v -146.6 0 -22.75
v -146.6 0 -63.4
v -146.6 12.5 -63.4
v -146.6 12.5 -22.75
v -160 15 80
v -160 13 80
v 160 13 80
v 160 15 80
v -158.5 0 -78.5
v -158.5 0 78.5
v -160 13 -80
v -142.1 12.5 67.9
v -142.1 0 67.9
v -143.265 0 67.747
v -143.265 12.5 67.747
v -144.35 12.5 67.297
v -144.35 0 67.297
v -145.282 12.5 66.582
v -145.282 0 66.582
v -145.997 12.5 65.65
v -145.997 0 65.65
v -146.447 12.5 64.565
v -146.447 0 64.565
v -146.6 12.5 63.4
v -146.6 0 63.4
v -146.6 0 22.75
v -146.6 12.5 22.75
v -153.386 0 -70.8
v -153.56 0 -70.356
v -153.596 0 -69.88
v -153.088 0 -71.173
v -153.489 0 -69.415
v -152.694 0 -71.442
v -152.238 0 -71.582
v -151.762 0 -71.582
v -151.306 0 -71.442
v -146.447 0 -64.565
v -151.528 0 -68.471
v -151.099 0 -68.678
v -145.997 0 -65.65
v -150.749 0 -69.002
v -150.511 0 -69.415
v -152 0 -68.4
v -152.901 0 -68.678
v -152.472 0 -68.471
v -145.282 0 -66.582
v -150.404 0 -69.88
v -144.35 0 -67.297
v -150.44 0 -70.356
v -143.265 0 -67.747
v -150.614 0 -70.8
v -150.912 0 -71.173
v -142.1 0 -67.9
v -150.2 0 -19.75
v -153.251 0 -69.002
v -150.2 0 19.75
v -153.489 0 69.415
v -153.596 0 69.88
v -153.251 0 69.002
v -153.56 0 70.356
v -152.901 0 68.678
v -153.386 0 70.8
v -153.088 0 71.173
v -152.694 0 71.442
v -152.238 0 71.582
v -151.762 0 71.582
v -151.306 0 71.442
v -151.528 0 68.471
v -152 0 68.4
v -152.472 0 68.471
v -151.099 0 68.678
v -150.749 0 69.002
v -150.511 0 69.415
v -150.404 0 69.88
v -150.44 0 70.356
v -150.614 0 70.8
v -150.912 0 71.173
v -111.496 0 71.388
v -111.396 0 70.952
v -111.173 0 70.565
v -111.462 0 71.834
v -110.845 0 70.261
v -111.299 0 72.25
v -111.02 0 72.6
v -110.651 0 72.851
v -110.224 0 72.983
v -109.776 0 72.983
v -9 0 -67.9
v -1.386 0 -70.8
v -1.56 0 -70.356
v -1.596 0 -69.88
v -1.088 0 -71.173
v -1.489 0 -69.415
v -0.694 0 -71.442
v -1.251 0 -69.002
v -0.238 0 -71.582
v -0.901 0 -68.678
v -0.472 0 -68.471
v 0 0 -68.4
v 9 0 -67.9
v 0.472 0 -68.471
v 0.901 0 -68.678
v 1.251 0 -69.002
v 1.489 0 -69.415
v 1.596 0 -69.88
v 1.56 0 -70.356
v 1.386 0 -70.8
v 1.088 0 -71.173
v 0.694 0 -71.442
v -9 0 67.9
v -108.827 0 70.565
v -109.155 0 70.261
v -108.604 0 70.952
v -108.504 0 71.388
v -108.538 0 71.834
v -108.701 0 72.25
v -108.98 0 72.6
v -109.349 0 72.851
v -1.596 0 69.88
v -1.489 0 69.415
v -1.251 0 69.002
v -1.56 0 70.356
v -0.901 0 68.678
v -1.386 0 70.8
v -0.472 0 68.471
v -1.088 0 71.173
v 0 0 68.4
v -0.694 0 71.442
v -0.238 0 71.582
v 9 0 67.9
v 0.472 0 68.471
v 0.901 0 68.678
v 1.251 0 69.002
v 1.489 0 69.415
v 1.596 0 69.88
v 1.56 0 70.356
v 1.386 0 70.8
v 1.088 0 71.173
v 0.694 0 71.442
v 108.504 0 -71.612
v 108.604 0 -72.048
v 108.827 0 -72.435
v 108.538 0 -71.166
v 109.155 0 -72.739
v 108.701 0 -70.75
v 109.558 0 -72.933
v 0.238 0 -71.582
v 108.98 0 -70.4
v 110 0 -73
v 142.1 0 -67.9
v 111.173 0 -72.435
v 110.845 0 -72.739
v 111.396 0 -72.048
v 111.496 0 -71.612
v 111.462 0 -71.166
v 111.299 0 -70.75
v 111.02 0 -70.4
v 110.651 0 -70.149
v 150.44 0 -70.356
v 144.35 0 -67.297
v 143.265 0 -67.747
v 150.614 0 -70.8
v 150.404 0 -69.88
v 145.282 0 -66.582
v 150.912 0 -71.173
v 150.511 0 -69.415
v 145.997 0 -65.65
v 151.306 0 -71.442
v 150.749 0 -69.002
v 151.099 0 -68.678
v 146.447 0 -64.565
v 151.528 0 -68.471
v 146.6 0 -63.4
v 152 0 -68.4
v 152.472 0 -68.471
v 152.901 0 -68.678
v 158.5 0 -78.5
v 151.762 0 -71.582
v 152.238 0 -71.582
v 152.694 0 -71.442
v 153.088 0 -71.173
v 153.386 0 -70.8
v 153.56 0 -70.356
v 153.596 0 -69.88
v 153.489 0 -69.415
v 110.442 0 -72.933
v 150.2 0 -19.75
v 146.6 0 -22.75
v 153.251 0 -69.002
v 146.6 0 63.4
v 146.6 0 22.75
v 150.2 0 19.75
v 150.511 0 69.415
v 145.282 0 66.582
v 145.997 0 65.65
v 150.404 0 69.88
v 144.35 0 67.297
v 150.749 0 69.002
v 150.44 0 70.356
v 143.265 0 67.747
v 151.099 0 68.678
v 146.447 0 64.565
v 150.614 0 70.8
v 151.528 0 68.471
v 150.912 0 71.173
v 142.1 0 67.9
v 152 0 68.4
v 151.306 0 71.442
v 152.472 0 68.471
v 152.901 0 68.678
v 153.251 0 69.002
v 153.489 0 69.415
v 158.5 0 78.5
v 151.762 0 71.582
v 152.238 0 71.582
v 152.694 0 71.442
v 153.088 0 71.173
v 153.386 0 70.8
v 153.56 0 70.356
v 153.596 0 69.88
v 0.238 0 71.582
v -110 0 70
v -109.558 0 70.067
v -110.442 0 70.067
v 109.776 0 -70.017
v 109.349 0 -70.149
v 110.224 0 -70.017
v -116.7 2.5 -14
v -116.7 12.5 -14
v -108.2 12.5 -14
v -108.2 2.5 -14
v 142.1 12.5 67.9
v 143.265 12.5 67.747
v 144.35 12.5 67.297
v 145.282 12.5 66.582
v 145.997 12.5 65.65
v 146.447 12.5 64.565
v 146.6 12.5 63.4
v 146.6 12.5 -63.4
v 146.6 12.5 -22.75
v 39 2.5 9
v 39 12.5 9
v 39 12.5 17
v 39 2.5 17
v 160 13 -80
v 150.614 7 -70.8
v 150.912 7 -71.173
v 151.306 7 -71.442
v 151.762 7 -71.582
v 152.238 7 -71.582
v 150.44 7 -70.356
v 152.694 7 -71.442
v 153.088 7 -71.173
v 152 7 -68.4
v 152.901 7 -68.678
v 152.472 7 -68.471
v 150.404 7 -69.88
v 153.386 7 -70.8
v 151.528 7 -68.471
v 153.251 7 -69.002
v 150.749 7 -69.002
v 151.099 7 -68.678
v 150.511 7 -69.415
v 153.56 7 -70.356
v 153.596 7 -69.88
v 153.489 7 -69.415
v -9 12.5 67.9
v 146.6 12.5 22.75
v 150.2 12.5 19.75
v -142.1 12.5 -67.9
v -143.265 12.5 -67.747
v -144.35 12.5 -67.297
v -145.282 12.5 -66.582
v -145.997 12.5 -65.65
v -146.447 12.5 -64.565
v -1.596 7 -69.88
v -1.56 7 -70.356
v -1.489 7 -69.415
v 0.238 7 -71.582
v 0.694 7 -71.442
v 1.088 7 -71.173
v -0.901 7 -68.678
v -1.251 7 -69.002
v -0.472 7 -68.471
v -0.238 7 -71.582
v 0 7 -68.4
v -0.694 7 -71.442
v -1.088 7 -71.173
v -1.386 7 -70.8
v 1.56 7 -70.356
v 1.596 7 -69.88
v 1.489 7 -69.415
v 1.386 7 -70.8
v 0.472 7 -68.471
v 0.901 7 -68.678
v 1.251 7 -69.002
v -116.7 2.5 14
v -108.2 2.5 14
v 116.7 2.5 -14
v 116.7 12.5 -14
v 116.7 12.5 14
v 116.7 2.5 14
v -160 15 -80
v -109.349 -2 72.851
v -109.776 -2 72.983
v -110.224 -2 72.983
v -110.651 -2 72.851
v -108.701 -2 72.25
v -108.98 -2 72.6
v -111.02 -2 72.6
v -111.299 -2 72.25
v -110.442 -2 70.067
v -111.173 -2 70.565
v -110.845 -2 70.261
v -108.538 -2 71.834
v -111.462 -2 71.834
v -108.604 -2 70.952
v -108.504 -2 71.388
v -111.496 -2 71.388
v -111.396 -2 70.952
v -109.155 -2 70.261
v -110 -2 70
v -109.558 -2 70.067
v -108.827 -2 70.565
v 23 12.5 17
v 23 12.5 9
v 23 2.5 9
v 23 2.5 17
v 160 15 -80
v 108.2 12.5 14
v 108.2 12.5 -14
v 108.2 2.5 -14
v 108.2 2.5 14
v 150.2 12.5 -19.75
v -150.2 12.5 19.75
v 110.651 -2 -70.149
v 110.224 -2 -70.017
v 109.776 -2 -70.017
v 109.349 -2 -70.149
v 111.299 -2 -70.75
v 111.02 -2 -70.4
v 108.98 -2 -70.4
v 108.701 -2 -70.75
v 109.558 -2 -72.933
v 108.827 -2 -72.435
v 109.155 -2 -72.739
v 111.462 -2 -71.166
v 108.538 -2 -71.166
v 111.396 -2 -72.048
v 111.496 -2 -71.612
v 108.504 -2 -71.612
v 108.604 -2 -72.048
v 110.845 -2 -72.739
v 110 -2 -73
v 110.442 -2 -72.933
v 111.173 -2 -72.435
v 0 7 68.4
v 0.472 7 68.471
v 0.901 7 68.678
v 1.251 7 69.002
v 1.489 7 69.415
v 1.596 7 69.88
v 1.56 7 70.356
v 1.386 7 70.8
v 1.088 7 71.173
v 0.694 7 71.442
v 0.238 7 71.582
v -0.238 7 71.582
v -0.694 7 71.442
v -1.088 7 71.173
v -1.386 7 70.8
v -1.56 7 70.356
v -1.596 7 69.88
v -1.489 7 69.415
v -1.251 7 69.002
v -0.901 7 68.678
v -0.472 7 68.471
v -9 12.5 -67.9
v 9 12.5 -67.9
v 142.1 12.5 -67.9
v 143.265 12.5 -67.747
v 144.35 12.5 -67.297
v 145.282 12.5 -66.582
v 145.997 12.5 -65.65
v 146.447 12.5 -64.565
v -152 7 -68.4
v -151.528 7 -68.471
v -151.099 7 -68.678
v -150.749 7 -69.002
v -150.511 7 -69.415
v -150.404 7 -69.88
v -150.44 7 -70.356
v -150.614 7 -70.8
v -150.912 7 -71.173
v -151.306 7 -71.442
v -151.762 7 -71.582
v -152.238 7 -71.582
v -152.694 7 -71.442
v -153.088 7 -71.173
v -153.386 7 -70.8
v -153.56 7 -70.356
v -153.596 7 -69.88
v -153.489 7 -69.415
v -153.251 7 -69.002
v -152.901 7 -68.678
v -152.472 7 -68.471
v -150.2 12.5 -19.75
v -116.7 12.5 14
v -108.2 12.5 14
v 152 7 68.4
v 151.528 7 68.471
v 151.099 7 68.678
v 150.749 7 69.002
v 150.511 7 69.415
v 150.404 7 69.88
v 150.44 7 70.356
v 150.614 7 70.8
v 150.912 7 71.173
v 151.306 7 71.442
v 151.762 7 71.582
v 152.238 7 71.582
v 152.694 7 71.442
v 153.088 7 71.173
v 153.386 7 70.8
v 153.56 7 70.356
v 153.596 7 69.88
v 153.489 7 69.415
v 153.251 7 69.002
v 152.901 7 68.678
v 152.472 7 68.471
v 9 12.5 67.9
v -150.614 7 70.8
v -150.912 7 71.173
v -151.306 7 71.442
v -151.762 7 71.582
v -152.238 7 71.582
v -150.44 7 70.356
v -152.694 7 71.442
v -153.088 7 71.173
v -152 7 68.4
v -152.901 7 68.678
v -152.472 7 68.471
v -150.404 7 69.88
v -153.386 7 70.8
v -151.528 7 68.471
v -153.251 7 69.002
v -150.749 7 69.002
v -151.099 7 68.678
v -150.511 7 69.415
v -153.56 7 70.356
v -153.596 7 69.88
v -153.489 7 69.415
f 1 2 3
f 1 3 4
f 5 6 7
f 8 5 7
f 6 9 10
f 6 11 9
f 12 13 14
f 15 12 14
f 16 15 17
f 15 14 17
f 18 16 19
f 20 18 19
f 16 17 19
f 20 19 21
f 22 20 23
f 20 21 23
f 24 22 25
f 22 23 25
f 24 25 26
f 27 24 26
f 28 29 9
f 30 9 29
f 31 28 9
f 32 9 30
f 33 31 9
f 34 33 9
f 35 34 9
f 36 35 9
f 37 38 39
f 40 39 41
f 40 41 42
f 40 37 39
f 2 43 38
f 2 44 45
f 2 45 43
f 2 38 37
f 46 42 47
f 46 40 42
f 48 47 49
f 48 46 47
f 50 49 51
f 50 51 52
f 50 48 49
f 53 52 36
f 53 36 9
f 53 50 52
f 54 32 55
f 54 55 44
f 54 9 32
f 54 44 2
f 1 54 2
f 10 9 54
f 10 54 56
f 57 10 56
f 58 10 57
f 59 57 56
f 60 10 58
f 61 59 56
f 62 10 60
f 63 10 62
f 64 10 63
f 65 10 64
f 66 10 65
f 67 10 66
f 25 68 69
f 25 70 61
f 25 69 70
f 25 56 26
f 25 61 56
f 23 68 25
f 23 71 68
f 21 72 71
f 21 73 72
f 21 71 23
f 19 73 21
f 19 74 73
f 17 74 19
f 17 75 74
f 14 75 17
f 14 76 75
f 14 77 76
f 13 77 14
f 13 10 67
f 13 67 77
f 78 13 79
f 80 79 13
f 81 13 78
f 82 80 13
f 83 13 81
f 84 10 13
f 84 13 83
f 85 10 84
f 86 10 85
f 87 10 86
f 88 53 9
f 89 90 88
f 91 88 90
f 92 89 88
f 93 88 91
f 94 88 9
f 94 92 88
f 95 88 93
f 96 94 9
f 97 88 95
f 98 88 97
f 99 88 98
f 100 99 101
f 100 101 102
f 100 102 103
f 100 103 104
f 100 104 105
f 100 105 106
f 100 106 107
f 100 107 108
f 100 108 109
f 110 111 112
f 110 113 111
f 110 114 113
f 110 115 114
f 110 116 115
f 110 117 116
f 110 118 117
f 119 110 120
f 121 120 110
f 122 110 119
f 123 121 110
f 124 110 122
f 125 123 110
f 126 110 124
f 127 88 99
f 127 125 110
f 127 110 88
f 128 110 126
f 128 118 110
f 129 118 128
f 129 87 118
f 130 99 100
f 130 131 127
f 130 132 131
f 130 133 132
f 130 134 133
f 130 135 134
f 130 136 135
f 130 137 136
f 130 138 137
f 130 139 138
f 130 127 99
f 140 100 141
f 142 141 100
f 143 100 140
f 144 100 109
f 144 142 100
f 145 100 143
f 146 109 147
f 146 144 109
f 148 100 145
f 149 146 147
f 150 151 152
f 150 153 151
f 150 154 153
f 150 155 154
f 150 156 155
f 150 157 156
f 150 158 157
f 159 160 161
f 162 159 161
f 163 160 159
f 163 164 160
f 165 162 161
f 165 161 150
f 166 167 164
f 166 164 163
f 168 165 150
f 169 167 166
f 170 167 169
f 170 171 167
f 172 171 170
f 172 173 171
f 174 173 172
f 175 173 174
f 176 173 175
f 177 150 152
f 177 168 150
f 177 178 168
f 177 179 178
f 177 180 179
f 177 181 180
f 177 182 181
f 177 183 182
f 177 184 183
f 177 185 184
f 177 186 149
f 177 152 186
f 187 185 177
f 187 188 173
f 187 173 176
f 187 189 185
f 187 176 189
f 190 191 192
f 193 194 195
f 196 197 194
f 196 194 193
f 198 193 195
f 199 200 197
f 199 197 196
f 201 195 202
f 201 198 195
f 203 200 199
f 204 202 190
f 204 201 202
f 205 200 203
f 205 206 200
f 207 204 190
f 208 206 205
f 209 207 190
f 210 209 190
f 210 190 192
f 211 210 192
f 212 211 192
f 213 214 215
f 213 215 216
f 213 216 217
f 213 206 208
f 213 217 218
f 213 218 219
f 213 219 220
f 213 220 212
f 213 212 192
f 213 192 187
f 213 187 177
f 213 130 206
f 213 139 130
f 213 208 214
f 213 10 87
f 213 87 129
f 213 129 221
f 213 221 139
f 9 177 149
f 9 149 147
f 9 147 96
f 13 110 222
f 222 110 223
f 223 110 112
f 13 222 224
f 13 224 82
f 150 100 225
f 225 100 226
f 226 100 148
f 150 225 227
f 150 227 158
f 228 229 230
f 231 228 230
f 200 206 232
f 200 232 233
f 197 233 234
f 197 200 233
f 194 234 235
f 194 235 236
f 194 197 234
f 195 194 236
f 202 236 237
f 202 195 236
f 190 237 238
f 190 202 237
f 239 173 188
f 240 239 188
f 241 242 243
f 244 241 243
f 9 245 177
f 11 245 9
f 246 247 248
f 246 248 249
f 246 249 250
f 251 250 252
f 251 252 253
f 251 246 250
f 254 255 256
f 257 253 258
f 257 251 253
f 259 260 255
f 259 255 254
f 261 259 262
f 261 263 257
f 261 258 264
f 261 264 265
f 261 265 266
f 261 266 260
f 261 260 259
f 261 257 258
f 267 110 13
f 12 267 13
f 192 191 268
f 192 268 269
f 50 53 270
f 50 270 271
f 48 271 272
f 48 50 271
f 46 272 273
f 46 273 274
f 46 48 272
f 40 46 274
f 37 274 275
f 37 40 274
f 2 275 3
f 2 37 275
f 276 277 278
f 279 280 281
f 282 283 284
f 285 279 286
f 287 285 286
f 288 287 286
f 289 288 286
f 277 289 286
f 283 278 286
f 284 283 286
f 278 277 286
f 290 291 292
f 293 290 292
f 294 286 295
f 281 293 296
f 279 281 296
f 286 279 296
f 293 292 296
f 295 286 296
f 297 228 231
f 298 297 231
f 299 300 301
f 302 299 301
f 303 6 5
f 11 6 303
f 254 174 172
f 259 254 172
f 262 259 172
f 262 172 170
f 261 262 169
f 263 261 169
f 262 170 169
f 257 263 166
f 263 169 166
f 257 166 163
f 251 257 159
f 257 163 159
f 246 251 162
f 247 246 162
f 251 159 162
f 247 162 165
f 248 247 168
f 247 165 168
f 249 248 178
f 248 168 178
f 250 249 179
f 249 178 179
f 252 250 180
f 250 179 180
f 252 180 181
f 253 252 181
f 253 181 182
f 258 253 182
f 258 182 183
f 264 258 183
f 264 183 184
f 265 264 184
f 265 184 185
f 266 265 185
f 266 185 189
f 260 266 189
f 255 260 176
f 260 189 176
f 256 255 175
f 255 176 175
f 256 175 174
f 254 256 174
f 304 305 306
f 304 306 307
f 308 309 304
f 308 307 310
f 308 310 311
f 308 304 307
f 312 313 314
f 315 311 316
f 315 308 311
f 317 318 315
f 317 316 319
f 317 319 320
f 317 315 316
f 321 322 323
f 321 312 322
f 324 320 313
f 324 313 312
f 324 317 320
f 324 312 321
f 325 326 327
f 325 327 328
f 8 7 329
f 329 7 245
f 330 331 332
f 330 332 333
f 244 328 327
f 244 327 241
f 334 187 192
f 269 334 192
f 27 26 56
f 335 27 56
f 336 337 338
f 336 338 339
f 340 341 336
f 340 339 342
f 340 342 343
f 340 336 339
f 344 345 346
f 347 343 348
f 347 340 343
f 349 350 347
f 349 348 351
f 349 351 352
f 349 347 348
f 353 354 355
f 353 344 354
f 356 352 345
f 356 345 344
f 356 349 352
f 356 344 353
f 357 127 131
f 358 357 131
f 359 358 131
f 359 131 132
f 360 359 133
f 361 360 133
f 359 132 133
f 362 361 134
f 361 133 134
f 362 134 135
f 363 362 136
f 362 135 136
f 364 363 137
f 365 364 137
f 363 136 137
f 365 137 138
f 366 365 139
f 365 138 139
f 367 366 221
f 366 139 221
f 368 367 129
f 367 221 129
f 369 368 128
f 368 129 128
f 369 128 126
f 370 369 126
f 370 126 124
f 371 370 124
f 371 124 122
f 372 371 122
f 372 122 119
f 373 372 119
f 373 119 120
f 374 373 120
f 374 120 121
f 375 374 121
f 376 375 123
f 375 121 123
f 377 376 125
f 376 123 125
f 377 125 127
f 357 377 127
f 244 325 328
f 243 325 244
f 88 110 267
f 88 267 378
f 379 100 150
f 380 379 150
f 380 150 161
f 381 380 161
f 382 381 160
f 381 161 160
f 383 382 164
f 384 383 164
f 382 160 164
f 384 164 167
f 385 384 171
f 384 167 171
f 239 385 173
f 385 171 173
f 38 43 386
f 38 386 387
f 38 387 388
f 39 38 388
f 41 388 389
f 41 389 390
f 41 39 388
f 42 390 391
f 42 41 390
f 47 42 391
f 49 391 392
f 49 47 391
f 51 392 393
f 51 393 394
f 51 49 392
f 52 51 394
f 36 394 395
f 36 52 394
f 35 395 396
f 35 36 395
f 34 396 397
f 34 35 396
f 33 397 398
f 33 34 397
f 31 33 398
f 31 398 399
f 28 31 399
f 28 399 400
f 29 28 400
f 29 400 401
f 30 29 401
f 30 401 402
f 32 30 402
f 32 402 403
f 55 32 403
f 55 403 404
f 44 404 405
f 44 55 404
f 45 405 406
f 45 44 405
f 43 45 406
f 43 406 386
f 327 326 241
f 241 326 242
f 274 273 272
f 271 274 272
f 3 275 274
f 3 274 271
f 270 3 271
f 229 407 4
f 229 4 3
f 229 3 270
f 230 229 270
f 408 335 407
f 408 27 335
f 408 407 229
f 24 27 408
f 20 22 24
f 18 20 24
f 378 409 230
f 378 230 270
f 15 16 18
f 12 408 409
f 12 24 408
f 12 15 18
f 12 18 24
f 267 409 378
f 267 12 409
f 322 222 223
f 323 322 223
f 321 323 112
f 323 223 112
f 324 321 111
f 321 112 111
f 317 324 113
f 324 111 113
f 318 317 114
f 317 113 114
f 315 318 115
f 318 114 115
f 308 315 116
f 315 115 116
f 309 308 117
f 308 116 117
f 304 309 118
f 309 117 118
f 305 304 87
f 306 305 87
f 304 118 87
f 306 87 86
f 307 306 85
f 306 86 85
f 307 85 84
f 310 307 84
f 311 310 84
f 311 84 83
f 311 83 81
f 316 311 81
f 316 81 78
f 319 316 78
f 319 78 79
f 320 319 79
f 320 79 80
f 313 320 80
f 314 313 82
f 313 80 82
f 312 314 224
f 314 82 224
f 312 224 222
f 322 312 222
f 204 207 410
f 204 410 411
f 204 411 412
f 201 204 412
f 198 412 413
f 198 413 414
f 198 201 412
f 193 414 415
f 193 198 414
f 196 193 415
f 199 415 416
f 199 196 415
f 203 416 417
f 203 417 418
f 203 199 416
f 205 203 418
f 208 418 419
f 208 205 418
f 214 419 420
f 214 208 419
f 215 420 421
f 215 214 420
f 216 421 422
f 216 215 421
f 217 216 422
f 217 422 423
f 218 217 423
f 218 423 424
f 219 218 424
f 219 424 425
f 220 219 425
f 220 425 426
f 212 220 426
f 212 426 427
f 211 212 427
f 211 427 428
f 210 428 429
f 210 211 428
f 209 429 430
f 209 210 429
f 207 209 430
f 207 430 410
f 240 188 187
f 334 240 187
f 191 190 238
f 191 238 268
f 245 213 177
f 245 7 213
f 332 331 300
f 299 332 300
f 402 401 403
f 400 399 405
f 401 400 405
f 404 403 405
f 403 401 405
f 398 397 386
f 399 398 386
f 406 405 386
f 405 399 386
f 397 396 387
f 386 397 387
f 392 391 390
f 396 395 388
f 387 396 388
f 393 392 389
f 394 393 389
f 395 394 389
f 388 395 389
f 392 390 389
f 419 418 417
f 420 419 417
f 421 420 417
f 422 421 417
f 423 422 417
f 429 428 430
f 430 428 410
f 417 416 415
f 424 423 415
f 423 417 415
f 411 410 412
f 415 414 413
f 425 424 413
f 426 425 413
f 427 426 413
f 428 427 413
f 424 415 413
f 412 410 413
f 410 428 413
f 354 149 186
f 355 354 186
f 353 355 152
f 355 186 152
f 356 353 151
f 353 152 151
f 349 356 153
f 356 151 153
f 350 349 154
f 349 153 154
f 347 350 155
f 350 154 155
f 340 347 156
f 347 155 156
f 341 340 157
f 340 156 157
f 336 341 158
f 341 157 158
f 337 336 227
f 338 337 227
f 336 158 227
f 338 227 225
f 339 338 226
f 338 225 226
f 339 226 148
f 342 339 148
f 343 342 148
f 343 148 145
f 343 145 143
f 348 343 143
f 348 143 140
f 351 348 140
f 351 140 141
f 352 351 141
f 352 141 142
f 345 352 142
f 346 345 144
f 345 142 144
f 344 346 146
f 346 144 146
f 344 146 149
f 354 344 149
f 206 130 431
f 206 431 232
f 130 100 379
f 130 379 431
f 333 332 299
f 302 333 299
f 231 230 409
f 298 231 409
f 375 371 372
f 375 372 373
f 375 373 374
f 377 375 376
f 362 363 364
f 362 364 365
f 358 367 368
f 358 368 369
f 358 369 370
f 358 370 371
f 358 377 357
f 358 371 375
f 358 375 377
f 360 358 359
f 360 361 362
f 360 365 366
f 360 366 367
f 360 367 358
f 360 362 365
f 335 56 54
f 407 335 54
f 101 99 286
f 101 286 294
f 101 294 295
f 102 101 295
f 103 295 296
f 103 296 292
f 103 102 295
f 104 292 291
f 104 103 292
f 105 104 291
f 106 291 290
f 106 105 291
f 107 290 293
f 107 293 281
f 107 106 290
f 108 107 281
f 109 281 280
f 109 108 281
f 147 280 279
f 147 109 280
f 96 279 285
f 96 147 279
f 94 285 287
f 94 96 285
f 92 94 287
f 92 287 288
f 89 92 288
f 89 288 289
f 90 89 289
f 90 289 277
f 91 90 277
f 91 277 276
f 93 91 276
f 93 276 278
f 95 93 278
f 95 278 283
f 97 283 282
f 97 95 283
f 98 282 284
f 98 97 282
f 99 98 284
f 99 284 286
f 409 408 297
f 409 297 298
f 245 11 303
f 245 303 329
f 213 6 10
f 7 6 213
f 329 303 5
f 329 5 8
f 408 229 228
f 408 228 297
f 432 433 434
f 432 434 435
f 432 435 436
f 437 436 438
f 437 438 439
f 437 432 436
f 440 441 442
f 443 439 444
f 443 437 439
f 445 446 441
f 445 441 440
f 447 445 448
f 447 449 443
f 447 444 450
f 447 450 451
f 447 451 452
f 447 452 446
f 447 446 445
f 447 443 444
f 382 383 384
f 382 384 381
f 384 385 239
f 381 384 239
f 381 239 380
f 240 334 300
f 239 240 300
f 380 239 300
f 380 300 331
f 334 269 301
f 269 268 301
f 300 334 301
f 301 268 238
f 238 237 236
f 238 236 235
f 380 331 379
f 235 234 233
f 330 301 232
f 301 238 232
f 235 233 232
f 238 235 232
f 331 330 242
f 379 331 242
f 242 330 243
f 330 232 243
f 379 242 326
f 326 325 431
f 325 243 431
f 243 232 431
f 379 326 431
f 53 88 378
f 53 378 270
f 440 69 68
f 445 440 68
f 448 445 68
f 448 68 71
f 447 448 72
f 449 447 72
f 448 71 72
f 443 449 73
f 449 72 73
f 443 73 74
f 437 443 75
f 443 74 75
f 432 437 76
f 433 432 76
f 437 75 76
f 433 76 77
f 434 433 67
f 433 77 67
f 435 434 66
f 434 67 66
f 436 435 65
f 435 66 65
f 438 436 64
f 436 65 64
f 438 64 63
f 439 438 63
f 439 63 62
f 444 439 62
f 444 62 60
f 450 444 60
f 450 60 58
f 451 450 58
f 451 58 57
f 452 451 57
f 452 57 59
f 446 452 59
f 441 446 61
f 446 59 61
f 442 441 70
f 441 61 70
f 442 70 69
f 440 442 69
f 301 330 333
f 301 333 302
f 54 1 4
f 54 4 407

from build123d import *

# Parameters (mm, degrees)
SKETCH2_W                                  = 320
SKETCH2_H                                  = 160
BOSS_EXTRUDE1_DEPTH                        = 2
SKETCH3_R                                  = 1.6
CUT_EXTRUDE1_DEPTH                         = 7
CUT_EXTRUDE2_DEPTH                         = 12.5
MIRROR1_AT_THE_SECOND_PLANE_COPY_1_SKETC_R = 1.6
MIRROR1_AT_THE_SECOND_PLANE_COPY_1_DEPTH   = 7
MIRROR1_AT_THE_SECOND_PLANE_COPY_2_DEPTH   = 12.5
SKETCH4_W                                  = 8.5
SKETCH4_H                                  = 28
SKETCH4_W_2                                = 16
SKETCH4_H_2                                = 8
BOSS_EXTRUDE3_DEPTH                        = 10
SKETCH5_R                                  = 1.5
BOSS_EXTRUDE4_DEPTH                        = 2


with BuildPart() as part:
    # Sketch2 → Boss-Extrude1 (new body)
    with BuildSketch(Plane(origin=(0, 13, 0), x_dir=(1, 0, 0), z_dir=(0, 1, 0))):
        Rectangle(SKETCH2_W, SKETCH2_H)
    extrude(amount=BOSS_EXTRUDE1_DEPTH)

    # Sketch1 → Loft1 section 0
    with BuildSketch(Plane(origin=(0, 0, 0), x_dir=(1, 0, 0), z_dir=(0, 1, 0))):
        with BuildLine():
            Line((-158.5, -78.5), (158.5, -78.5))
            Line((158.5, -78.5), (158.5, 78.5))
            Line((158.5, 78.5), (-158.5, 78.5))
            Line((-158.5, 78.5), (-158.5, -78.5))
        make_face()
    # Sketch2<2> → Loft1 section 1
    with BuildSketch(Plane(origin=(0, 13, 0), x_dir=(1, 0, 0), z_dir=(0, 1, 0))):
        with BuildLine():
            Line((160, -80), (-160, -80))
            Line((-160, -80), (-160, 80))
            Line((-160, 80), (160, 80))
            Line((160, 80), (160, -80))
        make_face()
    loft()

    # Sketch3 → Cut-Extrude1 (cut)
    with BuildSketch(Plane.XZ):
        with Locations((0, 70)):
            Circle(SKETCH3_R)
        with Locations((-152, 70)):
            Circle(SKETCH3_R)
    cut_extrude1 = extrude(amount=-CUT_EXTRUDE1_DEPTH, mode=Mode.SUBTRACT)

    # Sketch3<4> → Cut-Extrude2 (cut)
    with BuildSketch(Plane.XZ):
        with BuildLine():
            Line((-150.2, 0), (-9, 0))
            Line((-9, 0), (-9, 67.9))
            Line((-9, 67.9), (-142.1, 67.9))
            ThreePointArc((-142.1, 67.9), (-145.281980515, 66.581980515), (-146.6, 63.4))
            Line((-146.6, 63.4), (-146.6, 22.75))
            Line((-146.6, 22.75), (-150.2, 19.75))
            Line((-150.2, 19.75), (-150.2, 0))
        make_face()
    cut_extrude2 = extrude(amount=-CUT_EXTRUDE2_DEPTH, mode=Mode.SUBTRACT)

    # Mirror1: Cut-Extrude1, Cut-Extrude2 across plane
    add(cut_extrude1.mirror(Plane.XY), mode=Mode.SUBTRACT)
    add(cut_extrude2.mirror(Plane.XY), mode=Mode.SUBTRACT)

    # Mirror1 at the second plane: Cut-Extrude1, Cut-Extrude2 across plane
    add(cut_extrude1.mirror(Plane(origin=(0, 0, 0), x_dir=(0, 0, 1), z_dir=(1, 0, 0))), mode=Mode.SUBTRACT)
    add(cut_extrude2.mirror(Plane(origin=(0, 0, 0), x_dir=(0, 0, 1), z_dir=(1, 0, 0))), mode=Mode.SUBTRACT)

    # Mirror1 at the second plane copy 1 sketc → Mirror1 at the second plane copy 1 (cut)
    with BuildSketch(Plane(origin=(0, 0, 0), x_dir=(-1, 0, 0), z_dir=(0, -1, 0))):
        with Locations((0, 70)):
            Circle(MIRROR1_AT_THE_SECOND_PLANE_COPY_1_SKETC_R)
        with Locations((-152, 70)):
            Circle(MIRROR1_AT_THE_SECOND_PLANE_COPY_1_SKETC_R)
    extrude(amount=-MIRROR1_AT_THE_SECOND_PLANE_COPY_1_DEPTH, mode=Mode.SUBTRACT)

    # Mirror1 at the second plane copy 2 sketc → Mirror1 at the second plane copy 2 (cut)
    with BuildSketch(Plane(origin=(0, 0, 0), x_dir=(-1, 0, 0), z_dir=(0, -1, 0))):
        with BuildLine():
            Line((-150.2, 0), (-9, 0))
            Line((-9, 0), (-9, 67.9))
            Line((-9, 67.9), (-142.1, 67.9))
            ThreePointArc((-142.1, 67.9), (-145.281980515, 66.581980515), (-146.6, 63.4))
            Line((-146.6, 63.4), (-146.6, 22.75))
            Line((-146.6, 22.75), (-150.2, 19.75))
            Line((-150.2, 19.75), (-150.2, 0))
        make_face()
    extrude(amount=-MIRROR1_AT_THE_SECOND_PLANE_COPY_2_DEPTH, mode=Mode.SUBTRACT)

    # Sketch4 → Boss-Extrude3 (add)
    with BuildSketch(Plane.XZ.offset(-12.5)):
        with Locations((-112.45, 0)):
            Rectangle(SKETCH4_W, SKETCH4_H)
        with Locations((112.45, 0)):
            Rectangle(SKETCH4_W, SKETCH4_H)
        with Locations((31, 13)):
            Rectangle(SKETCH4_W_2, SKETCH4_H_2)
    extrude(amount=BOSS_EXTRUDE3_DEPTH)

    # Sketch5 → Boss-Extrude4 (add)
    with BuildSketch(Plane.XZ):
        with Locations((-110, 71.5)):
            Circle(SKETCH5_R)
        with Locations((110, -71.5)):
            Circle(SKETCH5_R)
    extrude(amount=BOSS_EXTRUDE4_DEPTH)


solid = part.part
